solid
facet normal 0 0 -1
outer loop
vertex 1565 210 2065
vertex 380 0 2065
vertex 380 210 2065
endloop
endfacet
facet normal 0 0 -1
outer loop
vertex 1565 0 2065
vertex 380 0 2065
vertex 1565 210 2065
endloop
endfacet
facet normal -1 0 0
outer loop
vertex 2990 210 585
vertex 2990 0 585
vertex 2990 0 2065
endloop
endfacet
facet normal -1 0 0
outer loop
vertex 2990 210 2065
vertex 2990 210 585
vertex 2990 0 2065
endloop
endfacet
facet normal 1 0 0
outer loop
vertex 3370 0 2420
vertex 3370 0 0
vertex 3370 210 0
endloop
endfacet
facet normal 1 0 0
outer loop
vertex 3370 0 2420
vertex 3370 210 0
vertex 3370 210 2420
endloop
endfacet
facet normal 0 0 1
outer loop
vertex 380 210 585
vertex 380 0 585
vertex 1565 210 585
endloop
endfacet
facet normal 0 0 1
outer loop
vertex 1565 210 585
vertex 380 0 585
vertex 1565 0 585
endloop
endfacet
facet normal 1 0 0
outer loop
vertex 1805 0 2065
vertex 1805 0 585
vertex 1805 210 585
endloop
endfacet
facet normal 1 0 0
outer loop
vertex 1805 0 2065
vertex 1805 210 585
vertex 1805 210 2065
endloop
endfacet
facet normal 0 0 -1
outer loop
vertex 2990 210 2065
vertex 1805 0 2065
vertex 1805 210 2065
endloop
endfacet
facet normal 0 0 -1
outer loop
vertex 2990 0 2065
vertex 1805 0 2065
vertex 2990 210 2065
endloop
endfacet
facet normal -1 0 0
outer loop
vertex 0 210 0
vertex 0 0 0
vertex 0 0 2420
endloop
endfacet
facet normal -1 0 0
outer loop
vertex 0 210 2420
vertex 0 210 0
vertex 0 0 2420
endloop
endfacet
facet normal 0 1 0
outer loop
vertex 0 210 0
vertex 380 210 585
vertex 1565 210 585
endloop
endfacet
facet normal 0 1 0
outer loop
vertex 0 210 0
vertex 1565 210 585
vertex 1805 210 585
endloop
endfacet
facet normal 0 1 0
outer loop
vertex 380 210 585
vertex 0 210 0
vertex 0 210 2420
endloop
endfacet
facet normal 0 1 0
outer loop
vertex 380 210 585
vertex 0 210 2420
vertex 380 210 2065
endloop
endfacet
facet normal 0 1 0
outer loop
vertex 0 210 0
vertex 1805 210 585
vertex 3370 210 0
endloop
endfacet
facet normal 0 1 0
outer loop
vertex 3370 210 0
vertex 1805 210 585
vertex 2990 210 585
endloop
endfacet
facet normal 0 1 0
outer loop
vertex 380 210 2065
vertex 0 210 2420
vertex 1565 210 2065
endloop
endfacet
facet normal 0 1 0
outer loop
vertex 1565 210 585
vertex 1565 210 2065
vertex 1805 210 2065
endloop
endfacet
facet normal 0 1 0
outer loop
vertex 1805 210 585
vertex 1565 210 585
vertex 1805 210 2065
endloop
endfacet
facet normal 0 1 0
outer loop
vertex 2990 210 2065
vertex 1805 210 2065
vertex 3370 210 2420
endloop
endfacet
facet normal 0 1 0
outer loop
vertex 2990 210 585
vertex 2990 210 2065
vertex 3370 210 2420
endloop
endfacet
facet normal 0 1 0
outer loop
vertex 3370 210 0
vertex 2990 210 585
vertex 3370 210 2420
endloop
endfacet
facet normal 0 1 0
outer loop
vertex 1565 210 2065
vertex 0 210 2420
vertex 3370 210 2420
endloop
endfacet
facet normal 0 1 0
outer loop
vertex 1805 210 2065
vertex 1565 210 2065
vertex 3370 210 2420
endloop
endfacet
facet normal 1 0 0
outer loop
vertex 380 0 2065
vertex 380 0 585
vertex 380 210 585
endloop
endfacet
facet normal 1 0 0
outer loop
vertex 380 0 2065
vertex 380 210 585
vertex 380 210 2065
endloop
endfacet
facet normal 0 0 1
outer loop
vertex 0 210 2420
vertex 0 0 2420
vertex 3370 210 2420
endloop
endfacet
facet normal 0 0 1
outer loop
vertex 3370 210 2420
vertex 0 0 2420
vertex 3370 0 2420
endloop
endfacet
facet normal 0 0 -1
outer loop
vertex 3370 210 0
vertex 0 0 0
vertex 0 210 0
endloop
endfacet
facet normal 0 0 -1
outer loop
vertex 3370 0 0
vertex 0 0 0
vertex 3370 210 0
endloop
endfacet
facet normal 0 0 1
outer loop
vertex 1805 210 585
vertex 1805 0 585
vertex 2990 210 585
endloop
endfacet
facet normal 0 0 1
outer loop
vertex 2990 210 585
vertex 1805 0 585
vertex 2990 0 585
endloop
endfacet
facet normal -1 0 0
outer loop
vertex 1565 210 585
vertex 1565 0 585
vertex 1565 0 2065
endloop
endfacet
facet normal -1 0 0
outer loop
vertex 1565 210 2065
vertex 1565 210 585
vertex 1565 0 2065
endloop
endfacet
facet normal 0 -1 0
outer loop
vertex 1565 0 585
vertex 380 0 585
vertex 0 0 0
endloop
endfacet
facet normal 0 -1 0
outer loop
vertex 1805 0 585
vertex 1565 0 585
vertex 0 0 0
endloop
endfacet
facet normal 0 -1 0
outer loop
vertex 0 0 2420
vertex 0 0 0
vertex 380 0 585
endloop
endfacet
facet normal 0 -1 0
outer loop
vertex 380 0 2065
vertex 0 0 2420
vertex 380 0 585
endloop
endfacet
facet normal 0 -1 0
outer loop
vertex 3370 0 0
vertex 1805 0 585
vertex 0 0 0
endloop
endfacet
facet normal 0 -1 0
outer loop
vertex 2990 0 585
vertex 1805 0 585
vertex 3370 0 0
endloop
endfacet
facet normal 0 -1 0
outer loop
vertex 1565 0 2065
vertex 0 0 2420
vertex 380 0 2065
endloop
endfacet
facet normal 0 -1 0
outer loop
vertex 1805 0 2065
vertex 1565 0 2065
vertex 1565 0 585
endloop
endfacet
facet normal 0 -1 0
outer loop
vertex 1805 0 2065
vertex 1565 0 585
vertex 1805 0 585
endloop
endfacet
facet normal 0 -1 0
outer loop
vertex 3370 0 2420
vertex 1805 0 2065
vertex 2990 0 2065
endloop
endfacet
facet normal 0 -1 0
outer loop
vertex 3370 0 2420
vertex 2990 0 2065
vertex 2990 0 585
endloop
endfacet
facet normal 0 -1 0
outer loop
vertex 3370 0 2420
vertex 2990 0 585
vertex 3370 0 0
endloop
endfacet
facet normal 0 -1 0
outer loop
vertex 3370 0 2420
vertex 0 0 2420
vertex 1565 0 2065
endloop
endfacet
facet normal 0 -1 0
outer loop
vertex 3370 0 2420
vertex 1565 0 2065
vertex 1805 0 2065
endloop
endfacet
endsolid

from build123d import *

# Parameters (mm, degrees)
SKETCH_W   = 3370
SKETCH_H   = 2420
SKETCH_W_2 = 1185
SKETCH_H_2 = 1480
PAD_DEPTH  = 210


with BuildPart() as part:
    # Sketch → Pad (new body)
    with BuildSketch(Plane.XZ):
        with Locations((1685, 1210)):
            Rectangle(SKETCH_W, SKETCH_H)
        with Locations((972.5, 1325)):
            Rectangle(SKETCH_W_2, SKETCH_H_2, mode=Mode.SUBTRACT)
        with Locations((2397.5, 1325)):
            Rectangle(SKETCH_W_2, SKETCH_H_2, mode=Mode.SUBTRACT)
    extrude(amount=-PAD_DEPTH)


solid = part.part
